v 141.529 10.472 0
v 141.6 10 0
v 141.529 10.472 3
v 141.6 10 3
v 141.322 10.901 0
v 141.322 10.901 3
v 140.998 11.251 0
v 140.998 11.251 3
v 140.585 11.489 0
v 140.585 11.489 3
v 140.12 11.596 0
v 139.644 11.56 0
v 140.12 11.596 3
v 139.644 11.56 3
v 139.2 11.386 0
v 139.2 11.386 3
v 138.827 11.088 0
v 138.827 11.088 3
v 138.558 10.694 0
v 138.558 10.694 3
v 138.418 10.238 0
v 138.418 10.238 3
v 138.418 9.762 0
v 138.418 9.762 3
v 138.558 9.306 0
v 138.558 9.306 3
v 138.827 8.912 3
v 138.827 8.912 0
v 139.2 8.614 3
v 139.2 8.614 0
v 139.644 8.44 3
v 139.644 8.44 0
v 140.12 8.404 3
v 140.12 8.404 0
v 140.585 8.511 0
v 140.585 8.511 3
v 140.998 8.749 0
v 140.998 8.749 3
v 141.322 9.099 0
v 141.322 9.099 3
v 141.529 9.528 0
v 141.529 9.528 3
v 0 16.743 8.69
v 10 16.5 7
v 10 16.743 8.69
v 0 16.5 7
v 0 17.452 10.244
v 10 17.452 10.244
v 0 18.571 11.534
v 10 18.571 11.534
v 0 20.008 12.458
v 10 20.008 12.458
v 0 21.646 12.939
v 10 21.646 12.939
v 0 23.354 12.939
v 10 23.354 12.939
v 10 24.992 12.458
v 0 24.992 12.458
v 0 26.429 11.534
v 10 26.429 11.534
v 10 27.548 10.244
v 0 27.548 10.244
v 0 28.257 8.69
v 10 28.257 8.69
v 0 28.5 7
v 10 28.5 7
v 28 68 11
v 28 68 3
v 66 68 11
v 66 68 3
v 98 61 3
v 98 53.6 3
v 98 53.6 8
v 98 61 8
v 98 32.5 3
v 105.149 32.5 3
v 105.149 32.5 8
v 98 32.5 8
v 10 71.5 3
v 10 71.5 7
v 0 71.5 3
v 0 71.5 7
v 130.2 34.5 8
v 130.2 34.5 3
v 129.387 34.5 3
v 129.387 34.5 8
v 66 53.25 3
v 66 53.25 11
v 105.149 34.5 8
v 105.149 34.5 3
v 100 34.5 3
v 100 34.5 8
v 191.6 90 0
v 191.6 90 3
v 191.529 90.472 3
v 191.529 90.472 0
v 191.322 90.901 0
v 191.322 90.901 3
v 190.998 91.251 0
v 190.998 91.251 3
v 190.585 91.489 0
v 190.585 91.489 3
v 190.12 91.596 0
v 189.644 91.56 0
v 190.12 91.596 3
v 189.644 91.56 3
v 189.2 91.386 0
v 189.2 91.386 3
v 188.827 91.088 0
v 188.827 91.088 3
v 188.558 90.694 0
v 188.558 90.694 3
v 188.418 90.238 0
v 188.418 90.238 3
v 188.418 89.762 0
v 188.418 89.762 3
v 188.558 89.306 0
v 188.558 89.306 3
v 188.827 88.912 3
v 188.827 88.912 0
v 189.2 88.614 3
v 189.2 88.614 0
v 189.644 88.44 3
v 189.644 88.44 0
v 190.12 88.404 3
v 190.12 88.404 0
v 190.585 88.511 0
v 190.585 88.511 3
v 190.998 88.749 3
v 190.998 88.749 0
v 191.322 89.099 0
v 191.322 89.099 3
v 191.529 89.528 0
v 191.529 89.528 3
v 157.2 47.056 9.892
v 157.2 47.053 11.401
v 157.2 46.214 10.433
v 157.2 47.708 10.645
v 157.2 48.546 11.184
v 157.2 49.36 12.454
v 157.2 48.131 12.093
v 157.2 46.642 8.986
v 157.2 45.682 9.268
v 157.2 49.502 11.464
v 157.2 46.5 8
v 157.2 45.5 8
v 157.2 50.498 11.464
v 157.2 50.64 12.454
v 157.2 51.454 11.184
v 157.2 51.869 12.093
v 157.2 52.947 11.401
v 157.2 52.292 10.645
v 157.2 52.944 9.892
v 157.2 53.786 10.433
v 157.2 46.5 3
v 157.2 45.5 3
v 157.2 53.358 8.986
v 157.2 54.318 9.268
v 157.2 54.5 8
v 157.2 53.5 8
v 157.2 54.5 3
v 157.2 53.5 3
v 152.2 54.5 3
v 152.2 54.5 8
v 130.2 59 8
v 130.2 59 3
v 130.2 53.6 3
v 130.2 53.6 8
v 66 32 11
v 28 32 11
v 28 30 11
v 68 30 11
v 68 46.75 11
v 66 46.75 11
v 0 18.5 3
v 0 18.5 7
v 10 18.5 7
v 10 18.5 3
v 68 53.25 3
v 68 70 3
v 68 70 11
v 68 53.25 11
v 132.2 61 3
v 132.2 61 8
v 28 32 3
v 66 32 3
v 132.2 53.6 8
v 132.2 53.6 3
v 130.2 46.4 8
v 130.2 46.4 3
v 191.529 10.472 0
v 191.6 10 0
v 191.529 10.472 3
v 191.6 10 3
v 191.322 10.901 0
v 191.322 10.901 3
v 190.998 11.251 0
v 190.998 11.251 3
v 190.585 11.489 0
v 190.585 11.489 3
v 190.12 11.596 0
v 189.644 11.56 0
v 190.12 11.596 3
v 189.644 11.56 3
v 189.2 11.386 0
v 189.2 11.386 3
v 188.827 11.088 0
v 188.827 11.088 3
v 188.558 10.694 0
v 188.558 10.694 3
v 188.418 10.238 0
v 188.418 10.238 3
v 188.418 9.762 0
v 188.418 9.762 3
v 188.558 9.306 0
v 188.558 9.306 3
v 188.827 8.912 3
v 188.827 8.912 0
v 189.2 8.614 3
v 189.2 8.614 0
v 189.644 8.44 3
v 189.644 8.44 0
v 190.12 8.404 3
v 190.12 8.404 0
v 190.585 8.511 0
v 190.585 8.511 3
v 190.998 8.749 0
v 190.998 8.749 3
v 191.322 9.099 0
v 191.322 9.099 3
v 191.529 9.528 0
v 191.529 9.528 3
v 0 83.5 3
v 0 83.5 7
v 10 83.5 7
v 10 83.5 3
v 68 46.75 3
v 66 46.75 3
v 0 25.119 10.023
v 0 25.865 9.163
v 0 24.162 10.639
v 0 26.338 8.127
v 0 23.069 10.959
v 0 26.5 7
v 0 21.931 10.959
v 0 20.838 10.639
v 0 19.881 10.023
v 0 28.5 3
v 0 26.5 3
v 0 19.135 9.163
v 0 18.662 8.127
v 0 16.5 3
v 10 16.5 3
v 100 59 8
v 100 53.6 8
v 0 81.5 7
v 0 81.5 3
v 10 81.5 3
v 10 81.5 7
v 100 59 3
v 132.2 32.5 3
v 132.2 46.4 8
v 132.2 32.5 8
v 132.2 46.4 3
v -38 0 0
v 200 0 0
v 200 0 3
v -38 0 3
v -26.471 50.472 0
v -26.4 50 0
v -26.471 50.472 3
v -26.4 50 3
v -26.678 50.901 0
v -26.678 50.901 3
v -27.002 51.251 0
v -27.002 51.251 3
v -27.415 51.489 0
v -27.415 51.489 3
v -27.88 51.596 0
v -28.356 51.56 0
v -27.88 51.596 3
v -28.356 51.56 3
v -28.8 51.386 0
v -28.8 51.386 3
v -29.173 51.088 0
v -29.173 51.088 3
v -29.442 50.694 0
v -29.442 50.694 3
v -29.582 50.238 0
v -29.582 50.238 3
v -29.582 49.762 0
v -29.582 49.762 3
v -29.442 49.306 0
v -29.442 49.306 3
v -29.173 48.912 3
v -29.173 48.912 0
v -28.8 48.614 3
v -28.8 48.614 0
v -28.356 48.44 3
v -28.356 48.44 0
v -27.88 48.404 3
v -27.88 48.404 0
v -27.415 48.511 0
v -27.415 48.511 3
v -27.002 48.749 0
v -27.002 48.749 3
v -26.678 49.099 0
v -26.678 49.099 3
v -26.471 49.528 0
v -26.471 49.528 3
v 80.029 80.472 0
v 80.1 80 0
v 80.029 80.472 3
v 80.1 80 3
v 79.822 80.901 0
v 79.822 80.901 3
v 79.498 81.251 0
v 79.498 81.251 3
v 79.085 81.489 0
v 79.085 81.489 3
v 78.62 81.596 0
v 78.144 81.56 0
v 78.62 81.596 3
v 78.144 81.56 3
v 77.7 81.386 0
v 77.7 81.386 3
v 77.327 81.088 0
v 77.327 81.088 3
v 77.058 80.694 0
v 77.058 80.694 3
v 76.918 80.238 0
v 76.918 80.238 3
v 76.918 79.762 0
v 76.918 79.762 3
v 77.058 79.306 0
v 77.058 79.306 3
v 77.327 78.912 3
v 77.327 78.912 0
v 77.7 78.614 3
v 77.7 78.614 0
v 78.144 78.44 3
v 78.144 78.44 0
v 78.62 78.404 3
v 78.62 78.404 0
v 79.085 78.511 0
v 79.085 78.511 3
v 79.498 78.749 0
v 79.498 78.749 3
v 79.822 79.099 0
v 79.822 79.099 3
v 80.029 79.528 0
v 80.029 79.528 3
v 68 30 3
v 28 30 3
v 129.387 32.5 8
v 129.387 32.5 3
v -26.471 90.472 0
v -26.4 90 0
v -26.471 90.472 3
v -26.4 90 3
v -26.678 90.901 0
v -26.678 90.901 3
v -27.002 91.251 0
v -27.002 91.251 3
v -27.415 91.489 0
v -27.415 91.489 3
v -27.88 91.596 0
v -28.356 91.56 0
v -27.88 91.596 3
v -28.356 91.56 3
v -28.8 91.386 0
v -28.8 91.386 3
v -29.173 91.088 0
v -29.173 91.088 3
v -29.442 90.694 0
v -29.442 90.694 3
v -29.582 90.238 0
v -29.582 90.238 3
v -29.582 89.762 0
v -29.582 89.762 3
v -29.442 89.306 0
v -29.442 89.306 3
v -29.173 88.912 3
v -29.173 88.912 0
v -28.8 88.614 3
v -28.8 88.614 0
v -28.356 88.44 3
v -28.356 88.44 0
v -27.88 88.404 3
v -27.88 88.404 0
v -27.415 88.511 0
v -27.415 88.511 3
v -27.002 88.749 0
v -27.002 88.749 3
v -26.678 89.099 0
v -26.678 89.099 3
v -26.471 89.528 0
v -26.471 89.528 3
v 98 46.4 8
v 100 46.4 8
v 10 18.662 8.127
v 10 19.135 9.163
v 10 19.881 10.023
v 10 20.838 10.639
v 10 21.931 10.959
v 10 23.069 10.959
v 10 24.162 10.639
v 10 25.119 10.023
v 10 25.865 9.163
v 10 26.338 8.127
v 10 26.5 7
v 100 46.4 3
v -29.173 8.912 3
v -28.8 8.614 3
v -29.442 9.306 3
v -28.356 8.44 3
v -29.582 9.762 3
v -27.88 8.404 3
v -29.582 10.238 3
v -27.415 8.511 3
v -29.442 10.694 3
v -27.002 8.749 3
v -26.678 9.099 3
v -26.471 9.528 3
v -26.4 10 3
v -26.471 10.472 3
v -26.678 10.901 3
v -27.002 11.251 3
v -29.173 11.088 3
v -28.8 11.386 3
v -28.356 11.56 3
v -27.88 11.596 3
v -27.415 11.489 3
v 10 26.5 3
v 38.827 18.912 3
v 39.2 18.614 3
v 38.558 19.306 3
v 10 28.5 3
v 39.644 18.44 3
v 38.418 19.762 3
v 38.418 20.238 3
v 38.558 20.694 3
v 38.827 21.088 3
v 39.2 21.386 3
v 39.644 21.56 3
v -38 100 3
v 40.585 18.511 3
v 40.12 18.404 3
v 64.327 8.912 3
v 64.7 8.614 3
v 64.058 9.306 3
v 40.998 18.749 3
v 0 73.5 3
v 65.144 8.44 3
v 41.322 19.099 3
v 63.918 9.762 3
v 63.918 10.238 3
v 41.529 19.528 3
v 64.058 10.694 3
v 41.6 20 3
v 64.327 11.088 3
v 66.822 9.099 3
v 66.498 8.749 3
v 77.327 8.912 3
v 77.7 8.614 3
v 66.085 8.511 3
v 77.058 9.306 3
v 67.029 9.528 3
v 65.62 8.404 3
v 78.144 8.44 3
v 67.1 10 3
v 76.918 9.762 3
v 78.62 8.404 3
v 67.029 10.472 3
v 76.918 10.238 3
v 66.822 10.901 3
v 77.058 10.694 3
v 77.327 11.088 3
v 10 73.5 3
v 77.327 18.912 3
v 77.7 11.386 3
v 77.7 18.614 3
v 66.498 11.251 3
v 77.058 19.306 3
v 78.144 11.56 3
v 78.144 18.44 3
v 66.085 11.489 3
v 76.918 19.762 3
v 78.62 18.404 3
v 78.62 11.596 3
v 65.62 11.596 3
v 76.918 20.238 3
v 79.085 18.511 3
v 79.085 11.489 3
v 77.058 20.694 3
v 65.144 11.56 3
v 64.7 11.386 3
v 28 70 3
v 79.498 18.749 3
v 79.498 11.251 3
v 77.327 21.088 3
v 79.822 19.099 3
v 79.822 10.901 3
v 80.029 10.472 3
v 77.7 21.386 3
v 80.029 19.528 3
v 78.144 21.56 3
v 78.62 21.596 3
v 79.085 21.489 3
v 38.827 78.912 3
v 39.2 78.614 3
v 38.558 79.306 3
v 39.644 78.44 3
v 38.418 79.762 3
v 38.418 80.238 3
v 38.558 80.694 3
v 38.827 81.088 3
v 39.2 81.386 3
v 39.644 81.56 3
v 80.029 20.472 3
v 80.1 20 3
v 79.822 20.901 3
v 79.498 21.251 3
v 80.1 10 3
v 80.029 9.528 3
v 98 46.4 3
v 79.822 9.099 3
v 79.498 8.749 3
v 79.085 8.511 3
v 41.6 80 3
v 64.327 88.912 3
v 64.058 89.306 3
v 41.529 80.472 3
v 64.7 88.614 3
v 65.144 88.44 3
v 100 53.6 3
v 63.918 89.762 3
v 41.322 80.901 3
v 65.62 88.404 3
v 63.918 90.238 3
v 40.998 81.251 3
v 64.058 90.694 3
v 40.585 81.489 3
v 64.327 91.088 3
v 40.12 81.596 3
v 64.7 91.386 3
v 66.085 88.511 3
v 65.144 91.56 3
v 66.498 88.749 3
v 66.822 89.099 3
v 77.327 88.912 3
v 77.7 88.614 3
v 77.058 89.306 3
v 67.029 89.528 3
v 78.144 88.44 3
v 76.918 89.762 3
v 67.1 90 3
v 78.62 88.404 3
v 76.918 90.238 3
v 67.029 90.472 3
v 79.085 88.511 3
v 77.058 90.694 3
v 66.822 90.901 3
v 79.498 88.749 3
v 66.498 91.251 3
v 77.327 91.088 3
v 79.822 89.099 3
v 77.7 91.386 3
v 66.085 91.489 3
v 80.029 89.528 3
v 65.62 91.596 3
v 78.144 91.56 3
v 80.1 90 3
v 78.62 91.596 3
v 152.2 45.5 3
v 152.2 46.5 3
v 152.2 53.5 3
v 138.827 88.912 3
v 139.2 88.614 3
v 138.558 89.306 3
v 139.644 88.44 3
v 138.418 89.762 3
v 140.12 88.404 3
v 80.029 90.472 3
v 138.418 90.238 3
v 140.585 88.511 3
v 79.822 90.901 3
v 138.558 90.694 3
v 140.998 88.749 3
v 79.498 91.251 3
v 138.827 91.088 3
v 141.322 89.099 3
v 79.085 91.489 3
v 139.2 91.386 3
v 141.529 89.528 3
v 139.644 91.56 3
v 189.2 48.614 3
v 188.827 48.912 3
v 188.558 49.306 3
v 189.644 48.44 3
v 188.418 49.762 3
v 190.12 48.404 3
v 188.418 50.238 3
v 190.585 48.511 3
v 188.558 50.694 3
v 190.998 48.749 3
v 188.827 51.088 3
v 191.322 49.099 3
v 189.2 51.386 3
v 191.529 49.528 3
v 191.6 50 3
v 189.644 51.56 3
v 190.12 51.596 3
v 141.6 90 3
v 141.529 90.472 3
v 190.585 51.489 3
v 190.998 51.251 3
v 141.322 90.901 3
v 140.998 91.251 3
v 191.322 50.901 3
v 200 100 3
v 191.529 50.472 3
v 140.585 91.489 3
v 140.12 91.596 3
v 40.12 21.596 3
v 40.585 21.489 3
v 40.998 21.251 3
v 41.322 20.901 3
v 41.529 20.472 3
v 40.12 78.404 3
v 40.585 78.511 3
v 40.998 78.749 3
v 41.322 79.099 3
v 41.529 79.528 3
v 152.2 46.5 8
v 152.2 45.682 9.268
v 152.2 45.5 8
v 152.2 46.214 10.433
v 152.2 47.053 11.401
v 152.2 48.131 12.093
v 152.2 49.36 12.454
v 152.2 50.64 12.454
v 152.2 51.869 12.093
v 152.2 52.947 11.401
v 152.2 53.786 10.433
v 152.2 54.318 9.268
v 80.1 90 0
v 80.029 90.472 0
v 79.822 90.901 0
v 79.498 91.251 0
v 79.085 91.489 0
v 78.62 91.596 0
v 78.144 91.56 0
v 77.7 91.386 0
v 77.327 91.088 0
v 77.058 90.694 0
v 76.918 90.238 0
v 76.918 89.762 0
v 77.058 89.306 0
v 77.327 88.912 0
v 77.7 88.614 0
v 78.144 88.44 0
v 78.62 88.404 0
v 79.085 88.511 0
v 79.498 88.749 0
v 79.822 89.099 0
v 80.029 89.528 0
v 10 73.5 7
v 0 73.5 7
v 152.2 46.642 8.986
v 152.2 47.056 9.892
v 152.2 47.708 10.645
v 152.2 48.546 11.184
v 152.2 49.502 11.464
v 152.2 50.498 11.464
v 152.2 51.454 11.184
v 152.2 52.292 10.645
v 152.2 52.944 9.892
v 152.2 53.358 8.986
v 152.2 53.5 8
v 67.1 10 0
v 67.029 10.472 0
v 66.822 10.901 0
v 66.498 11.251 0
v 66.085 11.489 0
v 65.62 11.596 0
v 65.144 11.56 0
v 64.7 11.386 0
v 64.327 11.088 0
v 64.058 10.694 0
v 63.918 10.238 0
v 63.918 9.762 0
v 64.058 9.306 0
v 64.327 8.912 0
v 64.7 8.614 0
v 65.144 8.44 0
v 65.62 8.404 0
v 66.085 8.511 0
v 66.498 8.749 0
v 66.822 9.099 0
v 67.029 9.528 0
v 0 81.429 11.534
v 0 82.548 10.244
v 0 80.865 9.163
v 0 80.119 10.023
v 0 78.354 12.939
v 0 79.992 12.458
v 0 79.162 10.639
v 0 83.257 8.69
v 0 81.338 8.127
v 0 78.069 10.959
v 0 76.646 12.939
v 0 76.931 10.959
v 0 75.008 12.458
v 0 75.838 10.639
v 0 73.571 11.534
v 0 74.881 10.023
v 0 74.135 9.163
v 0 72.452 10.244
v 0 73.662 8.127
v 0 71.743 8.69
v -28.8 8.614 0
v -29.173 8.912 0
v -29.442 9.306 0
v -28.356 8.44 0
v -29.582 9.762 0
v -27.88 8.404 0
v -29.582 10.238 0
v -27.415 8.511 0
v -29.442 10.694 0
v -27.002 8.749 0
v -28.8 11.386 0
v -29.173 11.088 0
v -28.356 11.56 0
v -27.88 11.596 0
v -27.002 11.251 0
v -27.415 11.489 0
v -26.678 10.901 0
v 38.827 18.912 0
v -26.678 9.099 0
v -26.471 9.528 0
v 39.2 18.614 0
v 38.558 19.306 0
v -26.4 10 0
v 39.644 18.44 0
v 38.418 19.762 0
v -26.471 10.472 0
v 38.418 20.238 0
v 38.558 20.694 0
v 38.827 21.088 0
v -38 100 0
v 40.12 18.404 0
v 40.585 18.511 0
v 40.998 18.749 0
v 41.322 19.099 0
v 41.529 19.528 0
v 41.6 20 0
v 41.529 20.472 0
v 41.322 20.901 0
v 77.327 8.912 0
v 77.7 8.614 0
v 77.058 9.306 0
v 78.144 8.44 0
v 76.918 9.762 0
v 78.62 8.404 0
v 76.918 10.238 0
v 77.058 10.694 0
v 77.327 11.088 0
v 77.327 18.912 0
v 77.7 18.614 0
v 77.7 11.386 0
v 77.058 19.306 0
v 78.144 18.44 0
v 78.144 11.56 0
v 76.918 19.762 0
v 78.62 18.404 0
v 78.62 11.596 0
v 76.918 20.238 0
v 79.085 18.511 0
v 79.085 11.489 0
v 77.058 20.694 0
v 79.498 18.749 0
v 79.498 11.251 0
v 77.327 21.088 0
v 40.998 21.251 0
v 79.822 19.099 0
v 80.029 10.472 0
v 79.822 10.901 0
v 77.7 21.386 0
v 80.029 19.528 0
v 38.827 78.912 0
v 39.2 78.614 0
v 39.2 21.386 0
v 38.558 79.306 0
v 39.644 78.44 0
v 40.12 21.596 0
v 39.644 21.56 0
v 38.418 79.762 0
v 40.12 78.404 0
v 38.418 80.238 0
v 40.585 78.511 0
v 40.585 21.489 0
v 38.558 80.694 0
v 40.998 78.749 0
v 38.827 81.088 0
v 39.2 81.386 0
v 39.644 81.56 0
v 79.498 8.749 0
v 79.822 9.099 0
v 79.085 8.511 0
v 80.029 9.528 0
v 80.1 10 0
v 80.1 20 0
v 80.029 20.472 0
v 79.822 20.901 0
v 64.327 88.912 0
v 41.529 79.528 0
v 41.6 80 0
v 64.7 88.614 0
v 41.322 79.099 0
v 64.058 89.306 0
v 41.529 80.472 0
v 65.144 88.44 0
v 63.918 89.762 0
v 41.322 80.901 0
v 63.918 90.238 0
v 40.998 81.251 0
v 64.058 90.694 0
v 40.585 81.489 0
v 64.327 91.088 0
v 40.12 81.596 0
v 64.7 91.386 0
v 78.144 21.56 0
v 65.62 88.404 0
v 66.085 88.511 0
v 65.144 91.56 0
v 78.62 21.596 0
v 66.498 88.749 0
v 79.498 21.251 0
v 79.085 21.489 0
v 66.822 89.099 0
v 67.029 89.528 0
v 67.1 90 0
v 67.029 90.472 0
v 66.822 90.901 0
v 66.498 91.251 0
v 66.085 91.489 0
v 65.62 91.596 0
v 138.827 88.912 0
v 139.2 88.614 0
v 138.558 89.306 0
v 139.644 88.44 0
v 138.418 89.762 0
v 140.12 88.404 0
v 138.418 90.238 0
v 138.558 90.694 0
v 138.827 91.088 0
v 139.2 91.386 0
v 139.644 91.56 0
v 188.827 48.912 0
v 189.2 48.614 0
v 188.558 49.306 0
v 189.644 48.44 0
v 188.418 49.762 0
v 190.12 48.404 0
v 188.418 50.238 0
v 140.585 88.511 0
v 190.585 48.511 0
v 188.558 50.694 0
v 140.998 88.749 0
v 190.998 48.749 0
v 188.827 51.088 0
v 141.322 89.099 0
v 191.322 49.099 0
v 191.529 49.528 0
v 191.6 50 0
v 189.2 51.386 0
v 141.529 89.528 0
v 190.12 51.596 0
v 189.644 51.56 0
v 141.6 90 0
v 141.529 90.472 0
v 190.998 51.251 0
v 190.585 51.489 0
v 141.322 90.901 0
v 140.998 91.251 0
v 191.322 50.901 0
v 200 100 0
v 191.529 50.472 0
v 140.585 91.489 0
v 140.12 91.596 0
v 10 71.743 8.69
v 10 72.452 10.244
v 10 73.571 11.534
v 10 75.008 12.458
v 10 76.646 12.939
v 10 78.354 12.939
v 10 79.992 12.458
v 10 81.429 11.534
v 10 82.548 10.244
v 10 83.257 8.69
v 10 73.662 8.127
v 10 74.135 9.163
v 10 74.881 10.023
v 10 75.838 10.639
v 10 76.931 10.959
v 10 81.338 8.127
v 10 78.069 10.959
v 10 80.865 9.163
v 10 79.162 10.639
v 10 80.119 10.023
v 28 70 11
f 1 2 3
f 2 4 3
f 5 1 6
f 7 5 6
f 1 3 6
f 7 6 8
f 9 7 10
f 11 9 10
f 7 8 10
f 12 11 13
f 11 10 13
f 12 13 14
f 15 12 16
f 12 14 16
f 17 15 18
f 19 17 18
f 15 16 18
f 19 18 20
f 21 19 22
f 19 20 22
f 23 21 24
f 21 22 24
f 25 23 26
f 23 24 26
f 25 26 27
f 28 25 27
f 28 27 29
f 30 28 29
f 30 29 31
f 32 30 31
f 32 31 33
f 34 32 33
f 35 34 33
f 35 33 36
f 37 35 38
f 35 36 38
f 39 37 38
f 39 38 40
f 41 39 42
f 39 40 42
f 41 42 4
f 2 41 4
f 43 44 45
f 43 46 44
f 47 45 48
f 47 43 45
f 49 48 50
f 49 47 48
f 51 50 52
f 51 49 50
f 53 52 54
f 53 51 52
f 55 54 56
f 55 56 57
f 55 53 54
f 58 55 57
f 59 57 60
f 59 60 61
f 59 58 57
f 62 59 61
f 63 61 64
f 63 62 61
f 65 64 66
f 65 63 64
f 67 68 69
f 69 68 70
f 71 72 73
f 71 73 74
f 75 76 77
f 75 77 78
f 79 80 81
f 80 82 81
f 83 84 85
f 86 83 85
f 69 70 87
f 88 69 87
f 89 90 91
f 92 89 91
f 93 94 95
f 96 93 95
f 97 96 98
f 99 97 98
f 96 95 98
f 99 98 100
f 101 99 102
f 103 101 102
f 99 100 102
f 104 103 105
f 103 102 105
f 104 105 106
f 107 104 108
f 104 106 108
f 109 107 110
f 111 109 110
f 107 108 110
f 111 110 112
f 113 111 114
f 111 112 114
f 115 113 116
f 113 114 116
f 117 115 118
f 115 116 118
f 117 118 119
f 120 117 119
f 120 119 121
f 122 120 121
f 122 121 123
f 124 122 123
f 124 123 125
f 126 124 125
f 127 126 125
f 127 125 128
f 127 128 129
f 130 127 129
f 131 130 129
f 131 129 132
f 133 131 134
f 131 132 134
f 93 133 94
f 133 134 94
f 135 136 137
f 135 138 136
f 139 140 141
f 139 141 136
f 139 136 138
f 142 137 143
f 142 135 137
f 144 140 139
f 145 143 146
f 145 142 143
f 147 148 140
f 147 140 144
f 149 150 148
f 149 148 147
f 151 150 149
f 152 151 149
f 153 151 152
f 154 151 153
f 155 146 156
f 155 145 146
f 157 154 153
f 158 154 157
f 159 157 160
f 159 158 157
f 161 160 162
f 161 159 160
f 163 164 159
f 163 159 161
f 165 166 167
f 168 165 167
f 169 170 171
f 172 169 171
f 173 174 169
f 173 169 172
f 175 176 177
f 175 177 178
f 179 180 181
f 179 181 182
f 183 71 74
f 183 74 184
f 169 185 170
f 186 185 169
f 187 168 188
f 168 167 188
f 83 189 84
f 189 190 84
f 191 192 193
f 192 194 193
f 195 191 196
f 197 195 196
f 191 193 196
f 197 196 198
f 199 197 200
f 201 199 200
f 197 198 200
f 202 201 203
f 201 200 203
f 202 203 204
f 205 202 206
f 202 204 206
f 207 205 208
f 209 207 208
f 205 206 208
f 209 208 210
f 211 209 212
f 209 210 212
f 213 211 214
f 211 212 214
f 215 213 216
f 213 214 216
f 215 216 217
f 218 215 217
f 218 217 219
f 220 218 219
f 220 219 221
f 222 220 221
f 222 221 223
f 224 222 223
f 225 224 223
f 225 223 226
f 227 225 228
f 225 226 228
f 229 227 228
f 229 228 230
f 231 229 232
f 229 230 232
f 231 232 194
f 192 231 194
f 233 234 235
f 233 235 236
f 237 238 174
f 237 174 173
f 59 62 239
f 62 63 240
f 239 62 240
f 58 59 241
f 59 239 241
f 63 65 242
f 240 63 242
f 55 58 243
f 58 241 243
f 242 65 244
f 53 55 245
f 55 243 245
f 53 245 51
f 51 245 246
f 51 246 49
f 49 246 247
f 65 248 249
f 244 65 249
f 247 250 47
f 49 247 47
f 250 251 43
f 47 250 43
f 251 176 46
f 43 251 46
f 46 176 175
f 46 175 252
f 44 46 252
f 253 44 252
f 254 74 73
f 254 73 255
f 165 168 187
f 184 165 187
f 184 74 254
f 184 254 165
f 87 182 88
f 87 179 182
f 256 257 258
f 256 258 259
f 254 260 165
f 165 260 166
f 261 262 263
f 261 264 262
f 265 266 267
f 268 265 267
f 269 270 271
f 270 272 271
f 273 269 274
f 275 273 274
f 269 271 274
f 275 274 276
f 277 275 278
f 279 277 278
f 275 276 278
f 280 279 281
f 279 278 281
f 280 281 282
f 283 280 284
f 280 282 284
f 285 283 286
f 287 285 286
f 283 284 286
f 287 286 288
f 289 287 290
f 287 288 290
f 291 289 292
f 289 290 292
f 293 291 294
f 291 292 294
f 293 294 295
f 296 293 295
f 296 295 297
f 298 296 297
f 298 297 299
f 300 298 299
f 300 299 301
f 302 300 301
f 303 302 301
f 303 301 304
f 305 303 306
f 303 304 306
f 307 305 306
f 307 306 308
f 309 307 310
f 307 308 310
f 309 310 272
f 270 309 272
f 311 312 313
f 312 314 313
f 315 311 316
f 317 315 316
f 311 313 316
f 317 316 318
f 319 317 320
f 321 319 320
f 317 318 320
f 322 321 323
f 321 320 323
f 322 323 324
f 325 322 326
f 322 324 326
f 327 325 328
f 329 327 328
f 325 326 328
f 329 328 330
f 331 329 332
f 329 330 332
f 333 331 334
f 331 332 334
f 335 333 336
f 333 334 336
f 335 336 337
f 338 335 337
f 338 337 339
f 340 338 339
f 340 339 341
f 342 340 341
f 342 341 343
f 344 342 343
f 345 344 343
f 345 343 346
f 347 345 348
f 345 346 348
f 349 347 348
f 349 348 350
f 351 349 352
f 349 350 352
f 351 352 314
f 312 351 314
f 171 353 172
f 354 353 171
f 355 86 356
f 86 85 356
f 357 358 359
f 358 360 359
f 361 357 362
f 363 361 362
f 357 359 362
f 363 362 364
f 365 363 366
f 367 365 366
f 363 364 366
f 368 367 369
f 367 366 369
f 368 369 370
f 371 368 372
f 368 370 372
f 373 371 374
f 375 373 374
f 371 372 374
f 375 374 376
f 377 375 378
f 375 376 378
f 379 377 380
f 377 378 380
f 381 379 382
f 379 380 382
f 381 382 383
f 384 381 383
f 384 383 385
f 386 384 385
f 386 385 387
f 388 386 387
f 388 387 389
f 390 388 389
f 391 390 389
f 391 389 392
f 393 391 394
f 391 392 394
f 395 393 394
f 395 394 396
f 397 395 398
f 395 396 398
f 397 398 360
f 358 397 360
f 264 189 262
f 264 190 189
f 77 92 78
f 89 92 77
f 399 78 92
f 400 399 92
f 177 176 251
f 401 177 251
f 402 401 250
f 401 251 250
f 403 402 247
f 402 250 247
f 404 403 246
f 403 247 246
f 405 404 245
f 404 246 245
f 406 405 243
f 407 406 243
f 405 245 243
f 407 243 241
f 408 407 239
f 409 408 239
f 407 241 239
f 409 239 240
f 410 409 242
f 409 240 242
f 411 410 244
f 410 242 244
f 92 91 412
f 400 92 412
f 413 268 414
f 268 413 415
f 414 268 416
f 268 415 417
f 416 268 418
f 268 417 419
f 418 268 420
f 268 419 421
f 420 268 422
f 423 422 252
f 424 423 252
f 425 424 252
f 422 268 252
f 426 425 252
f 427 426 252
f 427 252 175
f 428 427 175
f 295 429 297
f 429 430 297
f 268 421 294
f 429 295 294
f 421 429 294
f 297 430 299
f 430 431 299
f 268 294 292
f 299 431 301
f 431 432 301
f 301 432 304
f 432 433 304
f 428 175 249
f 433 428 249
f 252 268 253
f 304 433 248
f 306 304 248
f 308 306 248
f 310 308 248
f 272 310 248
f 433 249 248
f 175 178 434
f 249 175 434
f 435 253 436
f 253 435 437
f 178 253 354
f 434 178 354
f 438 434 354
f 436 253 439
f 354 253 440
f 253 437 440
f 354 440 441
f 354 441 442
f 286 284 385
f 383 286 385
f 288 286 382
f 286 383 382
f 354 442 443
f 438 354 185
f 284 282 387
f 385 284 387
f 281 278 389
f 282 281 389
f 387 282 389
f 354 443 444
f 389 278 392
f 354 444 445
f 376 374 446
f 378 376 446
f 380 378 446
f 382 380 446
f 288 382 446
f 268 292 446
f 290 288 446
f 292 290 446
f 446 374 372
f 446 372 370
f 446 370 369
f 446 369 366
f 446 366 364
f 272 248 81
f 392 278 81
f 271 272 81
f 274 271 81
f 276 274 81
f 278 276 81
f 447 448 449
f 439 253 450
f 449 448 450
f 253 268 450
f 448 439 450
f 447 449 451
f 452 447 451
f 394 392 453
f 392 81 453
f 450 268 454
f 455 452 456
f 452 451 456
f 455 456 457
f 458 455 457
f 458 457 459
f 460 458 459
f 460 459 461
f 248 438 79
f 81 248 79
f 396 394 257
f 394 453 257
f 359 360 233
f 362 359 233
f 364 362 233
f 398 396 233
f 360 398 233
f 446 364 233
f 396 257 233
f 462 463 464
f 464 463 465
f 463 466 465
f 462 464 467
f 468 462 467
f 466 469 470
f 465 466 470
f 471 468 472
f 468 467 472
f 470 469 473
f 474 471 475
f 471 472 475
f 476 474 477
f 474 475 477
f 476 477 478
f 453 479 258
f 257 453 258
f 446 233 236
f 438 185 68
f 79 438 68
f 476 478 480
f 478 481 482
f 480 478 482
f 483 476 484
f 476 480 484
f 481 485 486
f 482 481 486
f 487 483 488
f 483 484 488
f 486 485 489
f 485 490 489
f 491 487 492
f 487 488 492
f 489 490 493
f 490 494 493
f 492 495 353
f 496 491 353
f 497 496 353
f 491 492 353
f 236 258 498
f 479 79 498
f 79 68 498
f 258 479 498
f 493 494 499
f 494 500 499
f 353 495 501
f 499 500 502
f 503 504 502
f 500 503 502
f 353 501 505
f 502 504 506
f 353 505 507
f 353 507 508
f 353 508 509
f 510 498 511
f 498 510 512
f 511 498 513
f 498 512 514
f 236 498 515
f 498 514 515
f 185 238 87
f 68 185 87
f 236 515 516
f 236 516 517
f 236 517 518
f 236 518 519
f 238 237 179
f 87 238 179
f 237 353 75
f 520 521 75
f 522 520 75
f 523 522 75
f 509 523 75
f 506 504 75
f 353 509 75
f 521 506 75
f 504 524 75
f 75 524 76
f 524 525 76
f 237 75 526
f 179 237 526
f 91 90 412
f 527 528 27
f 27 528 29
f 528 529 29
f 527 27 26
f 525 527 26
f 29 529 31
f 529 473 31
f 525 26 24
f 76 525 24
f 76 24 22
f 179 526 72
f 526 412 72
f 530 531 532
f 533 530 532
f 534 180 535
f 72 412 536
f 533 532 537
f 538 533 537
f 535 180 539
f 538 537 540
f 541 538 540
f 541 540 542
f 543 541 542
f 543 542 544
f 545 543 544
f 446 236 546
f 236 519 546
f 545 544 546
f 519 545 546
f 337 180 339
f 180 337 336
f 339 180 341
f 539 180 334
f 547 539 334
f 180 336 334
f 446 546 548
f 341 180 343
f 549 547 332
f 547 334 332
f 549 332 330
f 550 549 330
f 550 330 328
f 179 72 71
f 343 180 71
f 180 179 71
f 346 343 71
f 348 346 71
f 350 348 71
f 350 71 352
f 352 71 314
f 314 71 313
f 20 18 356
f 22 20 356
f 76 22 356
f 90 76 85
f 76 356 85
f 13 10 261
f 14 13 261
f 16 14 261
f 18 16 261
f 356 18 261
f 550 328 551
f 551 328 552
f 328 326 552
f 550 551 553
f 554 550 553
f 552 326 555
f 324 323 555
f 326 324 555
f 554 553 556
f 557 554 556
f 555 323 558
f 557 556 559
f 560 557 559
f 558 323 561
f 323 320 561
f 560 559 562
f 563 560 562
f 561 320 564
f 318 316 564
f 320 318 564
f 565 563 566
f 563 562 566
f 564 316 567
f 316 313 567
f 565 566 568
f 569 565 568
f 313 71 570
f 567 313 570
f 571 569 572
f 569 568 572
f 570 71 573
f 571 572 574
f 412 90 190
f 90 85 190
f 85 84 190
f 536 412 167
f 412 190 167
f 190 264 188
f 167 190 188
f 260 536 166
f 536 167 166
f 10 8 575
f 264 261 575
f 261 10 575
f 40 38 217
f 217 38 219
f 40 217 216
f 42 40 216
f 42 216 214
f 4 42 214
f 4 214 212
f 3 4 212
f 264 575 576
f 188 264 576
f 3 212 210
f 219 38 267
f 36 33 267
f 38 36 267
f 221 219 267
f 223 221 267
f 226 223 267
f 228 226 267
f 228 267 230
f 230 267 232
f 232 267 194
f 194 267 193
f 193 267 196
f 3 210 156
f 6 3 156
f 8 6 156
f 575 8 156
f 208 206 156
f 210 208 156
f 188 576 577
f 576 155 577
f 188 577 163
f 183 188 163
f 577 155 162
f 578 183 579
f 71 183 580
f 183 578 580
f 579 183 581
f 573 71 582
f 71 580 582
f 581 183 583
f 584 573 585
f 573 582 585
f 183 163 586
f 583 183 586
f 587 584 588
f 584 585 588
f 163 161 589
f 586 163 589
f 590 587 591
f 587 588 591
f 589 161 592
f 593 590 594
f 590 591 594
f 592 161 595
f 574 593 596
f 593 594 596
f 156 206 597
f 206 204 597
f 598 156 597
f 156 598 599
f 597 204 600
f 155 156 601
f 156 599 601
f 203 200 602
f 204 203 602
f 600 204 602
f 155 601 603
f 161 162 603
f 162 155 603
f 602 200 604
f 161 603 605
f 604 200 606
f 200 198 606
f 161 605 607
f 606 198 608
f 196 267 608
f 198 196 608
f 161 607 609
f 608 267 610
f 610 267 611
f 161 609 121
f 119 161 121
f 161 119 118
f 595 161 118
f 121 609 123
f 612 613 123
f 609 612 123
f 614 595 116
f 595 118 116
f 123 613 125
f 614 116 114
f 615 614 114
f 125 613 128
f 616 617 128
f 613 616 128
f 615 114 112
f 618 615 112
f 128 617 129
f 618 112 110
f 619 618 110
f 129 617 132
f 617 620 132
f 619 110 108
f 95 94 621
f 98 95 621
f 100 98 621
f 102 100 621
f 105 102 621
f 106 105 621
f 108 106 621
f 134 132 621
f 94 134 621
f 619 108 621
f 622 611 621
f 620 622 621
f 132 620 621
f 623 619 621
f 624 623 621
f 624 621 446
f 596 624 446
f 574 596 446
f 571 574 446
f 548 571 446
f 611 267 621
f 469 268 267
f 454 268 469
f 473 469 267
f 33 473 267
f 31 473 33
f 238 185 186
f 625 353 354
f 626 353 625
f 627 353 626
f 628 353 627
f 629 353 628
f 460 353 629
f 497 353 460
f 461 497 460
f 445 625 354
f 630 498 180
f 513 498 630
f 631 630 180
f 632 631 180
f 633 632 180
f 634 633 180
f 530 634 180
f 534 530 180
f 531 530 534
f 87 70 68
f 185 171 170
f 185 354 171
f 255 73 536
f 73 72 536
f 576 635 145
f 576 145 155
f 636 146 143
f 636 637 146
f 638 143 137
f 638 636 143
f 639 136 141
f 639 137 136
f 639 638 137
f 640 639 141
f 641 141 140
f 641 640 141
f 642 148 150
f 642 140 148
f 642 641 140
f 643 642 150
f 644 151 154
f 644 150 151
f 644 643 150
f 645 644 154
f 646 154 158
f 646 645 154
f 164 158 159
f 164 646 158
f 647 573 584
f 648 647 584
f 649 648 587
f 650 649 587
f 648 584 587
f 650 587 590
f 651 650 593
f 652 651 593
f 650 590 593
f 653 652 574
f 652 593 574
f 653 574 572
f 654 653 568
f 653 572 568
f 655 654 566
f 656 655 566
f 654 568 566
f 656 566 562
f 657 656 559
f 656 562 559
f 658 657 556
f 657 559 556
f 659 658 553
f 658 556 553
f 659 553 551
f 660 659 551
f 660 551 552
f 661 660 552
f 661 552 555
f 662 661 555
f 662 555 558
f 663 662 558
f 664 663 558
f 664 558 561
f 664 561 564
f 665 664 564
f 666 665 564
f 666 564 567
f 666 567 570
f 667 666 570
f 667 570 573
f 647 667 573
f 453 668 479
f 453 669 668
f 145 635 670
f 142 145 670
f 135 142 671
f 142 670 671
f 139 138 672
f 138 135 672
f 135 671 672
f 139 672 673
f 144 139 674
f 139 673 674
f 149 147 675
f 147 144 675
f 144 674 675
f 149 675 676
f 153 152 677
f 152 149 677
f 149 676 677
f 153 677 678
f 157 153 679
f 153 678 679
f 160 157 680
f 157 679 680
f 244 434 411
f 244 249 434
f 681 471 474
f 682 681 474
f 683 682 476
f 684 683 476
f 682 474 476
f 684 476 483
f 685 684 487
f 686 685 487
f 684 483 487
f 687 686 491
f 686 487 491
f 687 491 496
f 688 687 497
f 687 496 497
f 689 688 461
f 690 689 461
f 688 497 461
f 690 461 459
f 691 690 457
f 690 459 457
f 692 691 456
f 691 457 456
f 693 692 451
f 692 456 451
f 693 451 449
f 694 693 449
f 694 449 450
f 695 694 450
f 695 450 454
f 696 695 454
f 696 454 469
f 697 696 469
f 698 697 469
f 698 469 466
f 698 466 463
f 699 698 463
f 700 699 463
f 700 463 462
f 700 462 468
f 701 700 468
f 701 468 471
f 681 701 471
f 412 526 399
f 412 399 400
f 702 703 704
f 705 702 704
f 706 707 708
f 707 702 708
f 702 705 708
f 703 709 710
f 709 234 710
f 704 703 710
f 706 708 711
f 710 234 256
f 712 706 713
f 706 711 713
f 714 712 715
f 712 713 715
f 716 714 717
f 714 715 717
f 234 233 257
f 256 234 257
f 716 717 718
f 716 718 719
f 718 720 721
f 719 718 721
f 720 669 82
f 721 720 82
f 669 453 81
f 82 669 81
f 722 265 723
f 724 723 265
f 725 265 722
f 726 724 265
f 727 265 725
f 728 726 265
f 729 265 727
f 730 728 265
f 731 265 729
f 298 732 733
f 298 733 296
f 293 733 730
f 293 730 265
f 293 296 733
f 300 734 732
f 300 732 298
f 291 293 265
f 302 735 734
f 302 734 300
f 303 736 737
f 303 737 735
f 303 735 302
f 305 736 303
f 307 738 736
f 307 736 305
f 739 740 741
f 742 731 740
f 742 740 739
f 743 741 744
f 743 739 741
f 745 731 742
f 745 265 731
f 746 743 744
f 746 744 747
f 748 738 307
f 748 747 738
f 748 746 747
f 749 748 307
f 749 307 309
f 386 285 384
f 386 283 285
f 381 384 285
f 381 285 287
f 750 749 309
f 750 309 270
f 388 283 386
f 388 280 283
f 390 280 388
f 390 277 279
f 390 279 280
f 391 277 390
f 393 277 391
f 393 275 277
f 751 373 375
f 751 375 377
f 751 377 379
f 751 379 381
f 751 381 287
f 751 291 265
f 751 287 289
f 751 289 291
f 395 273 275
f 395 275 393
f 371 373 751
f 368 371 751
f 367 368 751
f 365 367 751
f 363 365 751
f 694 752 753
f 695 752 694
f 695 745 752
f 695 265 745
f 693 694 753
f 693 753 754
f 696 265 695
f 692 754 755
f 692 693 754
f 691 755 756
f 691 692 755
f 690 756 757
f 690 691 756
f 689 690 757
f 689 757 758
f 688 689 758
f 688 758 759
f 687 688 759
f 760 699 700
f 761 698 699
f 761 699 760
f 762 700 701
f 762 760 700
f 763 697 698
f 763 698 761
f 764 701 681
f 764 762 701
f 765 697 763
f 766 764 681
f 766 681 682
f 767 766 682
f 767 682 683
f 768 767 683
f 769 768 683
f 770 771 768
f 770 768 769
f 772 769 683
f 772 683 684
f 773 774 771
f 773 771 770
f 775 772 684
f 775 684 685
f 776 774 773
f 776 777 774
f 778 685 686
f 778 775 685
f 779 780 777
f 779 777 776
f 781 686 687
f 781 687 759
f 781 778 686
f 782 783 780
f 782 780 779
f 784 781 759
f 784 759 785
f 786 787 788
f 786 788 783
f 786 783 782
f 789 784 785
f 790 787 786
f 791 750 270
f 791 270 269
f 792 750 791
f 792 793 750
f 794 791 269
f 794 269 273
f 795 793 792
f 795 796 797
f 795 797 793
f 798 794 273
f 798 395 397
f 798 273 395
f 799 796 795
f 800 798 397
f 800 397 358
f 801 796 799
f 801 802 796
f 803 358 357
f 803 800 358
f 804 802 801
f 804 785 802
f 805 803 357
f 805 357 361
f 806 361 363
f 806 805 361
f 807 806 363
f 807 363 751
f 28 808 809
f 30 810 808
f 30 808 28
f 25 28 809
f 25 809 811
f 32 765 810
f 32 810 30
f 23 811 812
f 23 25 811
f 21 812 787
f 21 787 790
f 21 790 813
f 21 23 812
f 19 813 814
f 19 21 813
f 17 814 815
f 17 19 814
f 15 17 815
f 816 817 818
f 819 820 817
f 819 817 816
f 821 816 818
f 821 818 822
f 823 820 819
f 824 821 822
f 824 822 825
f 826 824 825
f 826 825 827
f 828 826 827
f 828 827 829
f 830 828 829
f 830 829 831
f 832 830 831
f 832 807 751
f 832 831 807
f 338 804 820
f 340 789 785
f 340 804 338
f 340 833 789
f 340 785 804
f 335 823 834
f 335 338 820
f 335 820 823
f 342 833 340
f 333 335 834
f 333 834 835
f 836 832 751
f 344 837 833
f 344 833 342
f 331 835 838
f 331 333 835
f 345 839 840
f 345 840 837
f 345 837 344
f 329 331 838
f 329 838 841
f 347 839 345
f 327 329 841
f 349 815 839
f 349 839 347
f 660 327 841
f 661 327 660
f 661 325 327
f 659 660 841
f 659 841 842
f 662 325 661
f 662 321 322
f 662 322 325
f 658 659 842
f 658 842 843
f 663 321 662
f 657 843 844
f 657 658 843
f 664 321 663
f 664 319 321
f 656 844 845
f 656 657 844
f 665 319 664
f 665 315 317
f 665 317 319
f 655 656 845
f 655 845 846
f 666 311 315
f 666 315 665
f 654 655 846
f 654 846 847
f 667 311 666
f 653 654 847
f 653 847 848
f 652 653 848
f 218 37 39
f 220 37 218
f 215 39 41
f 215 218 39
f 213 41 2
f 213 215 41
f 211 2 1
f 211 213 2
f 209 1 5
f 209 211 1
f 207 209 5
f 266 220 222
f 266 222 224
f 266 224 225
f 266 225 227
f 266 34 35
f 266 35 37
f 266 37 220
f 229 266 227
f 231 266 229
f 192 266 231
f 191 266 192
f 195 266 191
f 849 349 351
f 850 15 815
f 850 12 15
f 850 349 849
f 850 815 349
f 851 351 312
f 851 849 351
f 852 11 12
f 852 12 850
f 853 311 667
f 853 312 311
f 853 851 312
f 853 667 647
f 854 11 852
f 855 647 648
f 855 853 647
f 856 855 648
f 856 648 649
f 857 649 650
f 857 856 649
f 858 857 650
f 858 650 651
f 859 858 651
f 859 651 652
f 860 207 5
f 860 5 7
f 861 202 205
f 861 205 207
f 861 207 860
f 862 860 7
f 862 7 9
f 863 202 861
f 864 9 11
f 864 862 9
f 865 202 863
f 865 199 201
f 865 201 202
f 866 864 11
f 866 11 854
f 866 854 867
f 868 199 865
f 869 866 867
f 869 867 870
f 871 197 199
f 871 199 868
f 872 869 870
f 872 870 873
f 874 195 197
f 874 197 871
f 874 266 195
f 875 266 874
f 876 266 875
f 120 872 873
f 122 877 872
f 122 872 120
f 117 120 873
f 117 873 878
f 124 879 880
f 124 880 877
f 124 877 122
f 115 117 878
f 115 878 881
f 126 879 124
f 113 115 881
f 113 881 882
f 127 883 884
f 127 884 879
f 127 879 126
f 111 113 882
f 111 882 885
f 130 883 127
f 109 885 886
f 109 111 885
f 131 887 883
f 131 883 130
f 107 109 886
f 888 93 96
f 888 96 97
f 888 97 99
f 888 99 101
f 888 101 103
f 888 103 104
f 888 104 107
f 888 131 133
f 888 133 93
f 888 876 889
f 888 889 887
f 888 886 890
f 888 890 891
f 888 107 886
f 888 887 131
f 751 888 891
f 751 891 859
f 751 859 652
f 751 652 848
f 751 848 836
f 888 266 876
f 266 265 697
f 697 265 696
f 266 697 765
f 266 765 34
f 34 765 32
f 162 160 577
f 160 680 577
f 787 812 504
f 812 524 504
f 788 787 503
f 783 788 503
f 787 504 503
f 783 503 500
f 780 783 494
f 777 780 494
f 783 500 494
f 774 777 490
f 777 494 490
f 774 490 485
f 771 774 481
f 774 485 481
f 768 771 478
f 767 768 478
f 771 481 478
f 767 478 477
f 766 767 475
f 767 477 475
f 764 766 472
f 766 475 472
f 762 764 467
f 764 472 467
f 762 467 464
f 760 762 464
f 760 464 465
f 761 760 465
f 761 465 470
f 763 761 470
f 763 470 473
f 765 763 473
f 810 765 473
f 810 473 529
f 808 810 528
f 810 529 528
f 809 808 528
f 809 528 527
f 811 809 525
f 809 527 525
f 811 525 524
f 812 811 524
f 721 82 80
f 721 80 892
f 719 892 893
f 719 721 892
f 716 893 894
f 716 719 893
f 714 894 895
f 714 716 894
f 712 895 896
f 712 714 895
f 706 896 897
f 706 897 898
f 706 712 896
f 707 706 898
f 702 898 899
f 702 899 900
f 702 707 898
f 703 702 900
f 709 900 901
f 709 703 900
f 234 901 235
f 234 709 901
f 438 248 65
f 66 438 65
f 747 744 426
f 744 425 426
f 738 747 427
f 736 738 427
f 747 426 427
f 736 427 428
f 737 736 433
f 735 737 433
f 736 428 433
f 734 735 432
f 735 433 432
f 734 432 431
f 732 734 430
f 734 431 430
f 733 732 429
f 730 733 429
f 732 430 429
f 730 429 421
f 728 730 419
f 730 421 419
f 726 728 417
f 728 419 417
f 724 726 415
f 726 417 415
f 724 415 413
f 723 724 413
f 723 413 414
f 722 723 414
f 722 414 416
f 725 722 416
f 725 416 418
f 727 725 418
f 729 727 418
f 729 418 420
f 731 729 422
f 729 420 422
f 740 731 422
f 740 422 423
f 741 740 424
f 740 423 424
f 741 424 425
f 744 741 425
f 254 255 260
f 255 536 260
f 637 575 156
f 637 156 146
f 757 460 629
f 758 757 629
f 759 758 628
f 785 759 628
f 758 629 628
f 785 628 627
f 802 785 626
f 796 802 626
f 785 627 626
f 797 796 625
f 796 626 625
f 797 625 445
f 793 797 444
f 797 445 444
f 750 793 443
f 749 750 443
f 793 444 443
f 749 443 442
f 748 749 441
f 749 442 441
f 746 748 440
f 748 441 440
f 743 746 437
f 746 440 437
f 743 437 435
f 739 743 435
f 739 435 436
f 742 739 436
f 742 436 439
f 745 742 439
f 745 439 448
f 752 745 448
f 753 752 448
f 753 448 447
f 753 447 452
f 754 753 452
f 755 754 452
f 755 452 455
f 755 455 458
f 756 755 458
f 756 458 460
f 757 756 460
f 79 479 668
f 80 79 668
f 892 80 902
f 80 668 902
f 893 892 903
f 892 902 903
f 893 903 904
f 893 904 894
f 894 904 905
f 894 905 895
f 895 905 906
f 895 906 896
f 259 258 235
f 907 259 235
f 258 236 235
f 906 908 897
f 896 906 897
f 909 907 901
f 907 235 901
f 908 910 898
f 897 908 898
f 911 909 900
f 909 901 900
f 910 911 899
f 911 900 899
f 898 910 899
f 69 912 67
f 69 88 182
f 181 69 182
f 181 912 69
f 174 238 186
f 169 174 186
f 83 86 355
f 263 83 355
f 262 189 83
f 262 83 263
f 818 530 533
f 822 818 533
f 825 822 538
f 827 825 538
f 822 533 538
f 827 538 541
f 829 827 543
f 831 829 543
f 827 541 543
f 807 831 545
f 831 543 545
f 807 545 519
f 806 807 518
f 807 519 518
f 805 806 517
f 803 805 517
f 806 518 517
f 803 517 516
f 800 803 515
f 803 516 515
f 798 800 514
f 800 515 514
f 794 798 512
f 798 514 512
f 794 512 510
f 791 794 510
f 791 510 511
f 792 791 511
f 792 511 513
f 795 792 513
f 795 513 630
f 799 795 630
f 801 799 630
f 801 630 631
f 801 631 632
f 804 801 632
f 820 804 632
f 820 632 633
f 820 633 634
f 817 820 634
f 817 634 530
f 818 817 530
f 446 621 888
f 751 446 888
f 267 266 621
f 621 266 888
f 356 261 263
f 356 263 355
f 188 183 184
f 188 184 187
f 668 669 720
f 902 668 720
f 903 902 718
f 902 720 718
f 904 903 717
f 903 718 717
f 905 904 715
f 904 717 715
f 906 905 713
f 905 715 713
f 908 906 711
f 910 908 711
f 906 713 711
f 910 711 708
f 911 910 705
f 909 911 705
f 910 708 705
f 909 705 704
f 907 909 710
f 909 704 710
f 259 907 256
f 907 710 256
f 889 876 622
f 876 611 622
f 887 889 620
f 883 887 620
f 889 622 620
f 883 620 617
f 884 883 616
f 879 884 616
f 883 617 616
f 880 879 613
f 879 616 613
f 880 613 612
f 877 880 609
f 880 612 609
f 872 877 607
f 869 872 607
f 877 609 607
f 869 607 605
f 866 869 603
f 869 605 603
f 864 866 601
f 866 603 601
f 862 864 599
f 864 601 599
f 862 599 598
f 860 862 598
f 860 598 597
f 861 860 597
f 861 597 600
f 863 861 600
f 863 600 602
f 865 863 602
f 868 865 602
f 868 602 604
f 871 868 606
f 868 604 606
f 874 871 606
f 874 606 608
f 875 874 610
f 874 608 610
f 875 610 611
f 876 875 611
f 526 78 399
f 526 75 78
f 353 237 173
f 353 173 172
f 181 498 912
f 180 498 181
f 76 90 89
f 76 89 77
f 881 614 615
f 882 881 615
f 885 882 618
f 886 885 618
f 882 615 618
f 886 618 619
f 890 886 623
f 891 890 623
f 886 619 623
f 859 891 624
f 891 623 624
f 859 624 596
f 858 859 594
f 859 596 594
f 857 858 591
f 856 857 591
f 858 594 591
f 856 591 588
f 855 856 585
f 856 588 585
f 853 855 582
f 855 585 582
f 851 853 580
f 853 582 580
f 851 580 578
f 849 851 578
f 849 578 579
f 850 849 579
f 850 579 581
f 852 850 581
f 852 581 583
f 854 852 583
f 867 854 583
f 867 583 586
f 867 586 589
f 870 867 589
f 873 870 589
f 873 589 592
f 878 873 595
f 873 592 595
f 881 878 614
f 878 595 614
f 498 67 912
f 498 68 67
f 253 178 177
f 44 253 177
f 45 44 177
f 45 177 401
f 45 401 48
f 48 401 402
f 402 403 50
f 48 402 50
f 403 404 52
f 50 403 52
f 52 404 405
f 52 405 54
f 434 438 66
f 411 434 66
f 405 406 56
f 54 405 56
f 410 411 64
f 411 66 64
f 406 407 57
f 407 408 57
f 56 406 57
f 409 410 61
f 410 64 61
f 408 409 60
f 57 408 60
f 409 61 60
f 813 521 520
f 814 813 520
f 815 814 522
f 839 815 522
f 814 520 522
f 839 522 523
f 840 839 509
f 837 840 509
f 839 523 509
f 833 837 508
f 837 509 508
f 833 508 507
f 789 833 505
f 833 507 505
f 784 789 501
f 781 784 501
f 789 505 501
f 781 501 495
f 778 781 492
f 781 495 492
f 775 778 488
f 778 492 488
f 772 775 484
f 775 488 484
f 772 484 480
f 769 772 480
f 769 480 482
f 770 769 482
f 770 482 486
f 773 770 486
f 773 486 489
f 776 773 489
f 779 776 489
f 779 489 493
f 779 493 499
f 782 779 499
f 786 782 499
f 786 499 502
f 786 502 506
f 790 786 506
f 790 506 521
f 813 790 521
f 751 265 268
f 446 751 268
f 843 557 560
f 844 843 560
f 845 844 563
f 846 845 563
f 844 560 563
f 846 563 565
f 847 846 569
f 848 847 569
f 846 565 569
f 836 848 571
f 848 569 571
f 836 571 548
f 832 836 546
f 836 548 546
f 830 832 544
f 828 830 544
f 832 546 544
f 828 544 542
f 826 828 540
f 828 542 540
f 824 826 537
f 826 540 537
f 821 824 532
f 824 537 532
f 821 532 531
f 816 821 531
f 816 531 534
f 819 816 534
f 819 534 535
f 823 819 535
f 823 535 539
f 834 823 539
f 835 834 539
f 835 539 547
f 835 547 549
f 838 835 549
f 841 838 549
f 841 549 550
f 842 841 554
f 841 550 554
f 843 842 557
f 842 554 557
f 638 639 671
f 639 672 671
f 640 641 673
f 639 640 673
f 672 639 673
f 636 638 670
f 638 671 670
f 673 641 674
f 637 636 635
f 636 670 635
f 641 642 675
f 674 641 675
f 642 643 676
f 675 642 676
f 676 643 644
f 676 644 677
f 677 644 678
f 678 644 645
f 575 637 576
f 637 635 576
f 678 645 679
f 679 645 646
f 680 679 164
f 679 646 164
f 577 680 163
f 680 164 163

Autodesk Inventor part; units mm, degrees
ref_plane "YZ Plane" through (0, 0, 0) normal (1, 0, 0) x (0, 1, 0)
ref_plane "XZ Plane" through (0, 0, 0) normal (0, 1, 0) x (-1, 0, 0)
ref_plane "XY Plane" through (0, 0, 0) normal (0, 0, 1) x (1, 0, 0)
sketch "Sketch1" plane through (0, 0, 0) normal (0, 0, 1) x (1, 0, 0)
  line L0 (0, 0) -> (200, 0)
  line L1 (200, 0) -> (200, 100)
  line L2 (200, 100) -> (0, 100)
  line L3 (0, 100) -> (0, 0)
  dimension "d0" = 200
  dimension "d1" = 100
extrude "Extrusion1" add sketch "Sketch1" along normal blind 3
sketch "Sketch2" plane through (0, 0, 2) normal (-1, 0, 0) x (0, 0, 1)
  line L0 (1, 0) -> (1, 100) projected
  line L1 (1, 81.5) -> (5, 81.5)
  arc A0 (5, 73.5) -> (5, 81.5) centre (5, 77.5) ccw
  line L2 (5, 73.5) -> (1, 73.5)
  arc A1 (5, 71.5) -> (5, 83.5) centre (5, 77.5) ccw
  line L3 (5, 83.5) -> (1, 83.5)
  line L4 (5, 71.5) -> (1, 71.5)
  line L5 (1, 28.5) -> (5, 28.5)
  arc A2 (5, 16.5) -> (5, 28.5) centre (5, 22.5) ccw
  line L6 (5, 16.5) -> (1, 16.5)
  line L7 (1, 26.5) -> (5, 26.5)
  arc A3 (5, 18.5) -> (5, 26.5) centre (5, 22.5) ccw
  line L8 (5, 18.5) -> (1, 18.5)
  line L9 (1, 50) -> (8.8605, 50) construction
  line L10 (5, 77.5) -> (5, 22.5) construction
  point P0 (-2, 0)
  point P1 (5, 50)
  dimension "d4" = 8
  dimension "d5" = 2
  dimension "d6" = 2
  dimension "d7" = 8
  dimension "d8" = 55
  dimension "d9" = 4
extrude "Extrusion2" add sketch "Sketch2" against normal blind 10 contours L0 L2 A0 L1 L3 A1 L4 | L0 L8 A3 L7 L5 A2 L6
sketch "Sketch3" plane through (0, 0, 3) normal (0, 0, 1) x (1, 0, 0)
  line L0 (0, 71.5) -> (0, 28.5) projected
  line L1 (0, 50) -> (200, 50) construction
  line L2 (200, 0) -> (200, 100) projected
  line L3 (68, 30) -> (28, 30)
  line L4 (28, 30) -> (28, 70)
  line L5 (28, 70) -> (68, 70)
  line L6 (68, 70) -> (68, 30)
  line L7 (68, 30) -> (28, 70) construction
  line L8 (28, 30) -> (68, 70) construction
  line L9 (66, 32) -> (30, 32)
  line L10 (30, 32) -> (30, 68)
  line L11 (30, 68) -> (66, 68)
  line L12 (66, 68) -> (66, 32)
  line L13 (66, 32) -> (30, 68) construction
  line L14 (30, 32) -> (66, 68) construction
  line L15 (30, 68) -> (28, 68)
  line L16 (28, 68) -> (28, 32)
  line L17 (28, 32) -> (30, 32)
  line L18 (30, 32) -> (30, 68)
  line L19 (66, 46.75) -> (68, 46.75)
  line L20 (68, 46.75) -> (68, 53.25)
  line L21 (68, 53.25) -> (66, 53.25)
  line L22 (66, 53.25) -> (66, 46.75)
  point P0 (0, 0)
  point P1 (48, 50)
  point P2 (48, 50)
  point P3 (66, 50)
  dimension "d15" = 36
  dimension "d17" = 36
  dimension "d18" = 2
  dimension "d19" = 2
  dimension "d20" = 28
  dimension "d23" = 6.5
extrude "Extrusion3" add sketch "Sketch3" along normal blind 8 contours L3 L4 L17 L9 L12 L19 L6 | L21 L12 L11 L15 L4 L5 L6
sketch "Sketch4" plane through (0, 0, 3) normal (0, 0, 1) x (1, 0, 0)
  line L0 (0, 71.5) -> (0, 28.5) projected
  line L1 (200, 0) -> (200, 100) projected
  line L2 (100, 59) -> (130.2, 59)
  line L3 (130.2, 59) -> (130.2, 34.5)
  line L4 (130.2, 34.5) -> (100, 34.5)
  line L5 (100, 34.5) -> (100, 59)
  line L6 (98, 61) -> (132.2, 61)
  line L7 (132.2, 61) -> (132.2, 32.5)
  line L8 (132.2, 32.5) -> (98, 32.5)
  line L9 (98, 32.5) -> (98, 61)
  line L10 (88, 53.6) -> (98, 53.6) construction
  line L11 (98, 46.4) -> (88, 46.4) construction
  line L12 (88, 46.4) -> (88, 53.6) construction
  line L13 (88, 50) -> (0, 50) construction
  line L14 (68, 53.25) -> (68, 70) projected
  line L15 (98, 53.6) -> (100, 53.6)
  line L16 (98, 46.4) -> (100, 46.4)
  line L17 (130.2, 53.6) -> (132.2, 53.6)
  line L18 (130.2, 46.4) -> (132.2, 46.4)
  line L19 (105.149, 34.5) -> (105.149, 32.5)
  line L20 (129.3871, 34.5) -> (129.3871, 32.5)
  point P0 (0, 0)
  dimension "d24" = 24.5
  dimension "d25" = 30.2
  dimension "d26" = 2
  dimension "d27" = 2
  dimension "d28" = 2
  dimension "d29" = 2
  dimension "d30" = 7.2
  dimension "d31" = 10
  dimension "d32" = 20
  dimension "d33" = 9
extrude "Extrusion4" add sketch "Sketch4" along normal blind 5 contours L5 L15 L9 L6 L7 L17 L3 L2 | L5 L4 L19 L8 L9 L16 | L18 L7 L8 L20 L4 L3
sketch "Sketch5" plane through (0, 0, 0) normal (-1, 0, 0) x (0, 0, 1)
  line L0 (0, 0) -> (0, 100) projected
  line L1 (3, 0) -> (3, 100) projected
  line L2 (0, 0) -> (3, 0)
  line L3 (3, 0) -> (3, 100)
  line L4 (3, 100) -> (0, 100)
  line L5 (0, 100) -> (0, 0)
extrude "Extrusion5" add sketch "Sketch5" along normal blind 38
sketch "Sketch6" plane through (0, 0, 3) normal (0, 0, 1) x (1, 0, 0)
  circle A0 centre (-28, 10) radius 1.6
  circle A1 centre (140, 10) radius 1.6
  circle A2 centre (190, 10) radius 1.6
  circle A3 centre (190, 50) radius 1.6
  circle A4 centre (190, 90) radius 1.6
  circle A5 centre (140, 90) radius 1.6
  circle A6 centre (-28, 90) radius 1.6
  line L0 (-28, 90) -> (190, 90) construction
  line L1 (190, 90) -> (190, 10) construction
  line L2 (190, 10) -> (-28, 10) construction
  line L3 (-28, 10) -> (-28, 90) construction
  line L4 (200, 100) -> (-38, 100) projected
  line L5 (-38, 0) -> (-38, 100) projected
  line L6 (200, 0) -> (-38, 0) projected
  line L7 (200, 0) -> (200, 100) projected
  line L8 (-38, 50) -> (200, 50) construction
  circle A7 centre (-28, 50) radius 1.6
  line L9 (0, 83.5) -> (0, 71.5) projected
  line L10 (140, 90) -> (140, 10) construction
  line L11 (40, 80) -> (78.5, 80) construction
  line L12 (78.5, 80) -> (78.5, 20) construction
  line L13 (78.5, 20) -> (40, 20) construction
  line L14 (40, 20) -> (40, 80) construction
  circle A8 centre (40, 80) radius 1.6
  circle A9 centre (78.5, 80) radius 1.6
  circle A10 centre (40, 20) radius 1.6
  circle A11 centre (78.5, 20) radius 1.6
  point P0 (0, 0)
  dimension "d38" = 3.2
  dimension "d41" = 3.2
  dimension "d42" = 3.2
  dimension "d43" = 3.2
  dimension "d44" = 3.2
  dimension "d45" = 3.2
  dimension "d48" = 3.2
  dimension "d49" = 10
  dimension "d50" = 10
  dimension "d51" = 10
  dimension "d52" = 10
  dimension "d53" = 3.2
  dimension "d56" = 50
  dimension "d68" = 60
  dimension "d69" = 3.2
  dimension "d70" = 3.2
  dimension "d71" = 3.2
  dimension "d72" = 3.2
  dimension "d73" = 40
  dimension "d74" = 38.5
extrude "Extrusion6" cut sketch "Sketch6" against normal blind 5 contours A0 | A1 | A2 | A3 | A4 | A5 | A6 | A7 | A8 | A9 | A10 | A11
ref_plane "Work Plane1" through (152.2, 32.5, 3) normal (1, 0, 0) x (0, 0, -1)
sketch "Sketch7" plane through (152.2, 32.5, 3) normal (1, 0, 0) x (0, 0, -1)
  line L0 (0, 13.9) -> (0, 2) projected
  line L1 (0, 13) -> (-5, 13)
  arc A0 (-5, 22) -> (-5, 13) centre (-5, 17.5) ccw
  line L2 (-5, 22) -> (0, 22)
  line L3 (0, 21.1) -> (0, 28.5) projected
  arc A1 (-5, 21) -> (-5, 14) centre (-5, 17.5) ccw
  line L4 (-5, 14) -> (0, 14)
  line L5 (-5, 21) -> (0, 21)
  line L6 (0, -32.5) -> (0, 67.5) projected
  line L7 (0, 13.9) -> (-5, 13.9) projected
  line L8 (0, 21.1) -> (-5, 21.1) projected
  line L9 (-5, 13.9) -> (-5, 21.1) construction
  line L10 (-5, 17.5) -> (-5, 17.5) construction
  point P0 (3, -32.5)
  point P1 (0, 0)
  dimension "d63" = 3.5
  dimension "d64" = 4.5
  dimension "d65" = 5
extrude "Extrusion7" add sketch "Sketch7" along normal blind 5 contours L0 L1 A0 L2 L3 L6 L5 A1 L4
sketch "Sketch9" plane through (0, 0, 3) normal (0, 0, 1) x (1, 0, 0)
  line L0 (65.5, 10) -> (78.5, 10) construction
  line L1 (78.5, 10) -> (78.5, 90) construction
  line L2 (78.5, 90) -> (65.5, 90) construction
  line L3 (65.5, 90) -> (65.5, 10) construction
  line L4 (65.5, 10) -> (78.5, 90) construction
  line L5 (78.5, 10) -> (65.5, 90) construction
  line L6 (-38, 100) -> (-38, 0) projected
  line L7 (-38, 50) -> (72, 50) construction
  circle A0 centre (65.5, 90) radius 1.6
  circle A1 centre (78.5, 90) radius 1.6
  circle A2 centre (65.5, 10) radius 1.6
  circle A3 centre (78.5, 10) radius 1.6
  circle A4 centre (-28, 90) radius 1.6 projected
  line L8 (-28, 90) -> (65.5, 90) construction
  point P0 (0, 0)
  dimension "d91" = 110
  dimension "d92" = 3.2
  dimension "d93" = 3.2
  dimension "d94" = 3.2
  dimension "d95" = 3.2
  dimension "d96" = 13
extrude "Extrusion8" cut sketch "Sketch9" against normal blind 10 contours A0 | A1 | A2 | A3
equation "\"d50\" = d49"
equation "\"d51\" = d49"
equation "\"d52\" = d49"
properties part number "lowerBase"
